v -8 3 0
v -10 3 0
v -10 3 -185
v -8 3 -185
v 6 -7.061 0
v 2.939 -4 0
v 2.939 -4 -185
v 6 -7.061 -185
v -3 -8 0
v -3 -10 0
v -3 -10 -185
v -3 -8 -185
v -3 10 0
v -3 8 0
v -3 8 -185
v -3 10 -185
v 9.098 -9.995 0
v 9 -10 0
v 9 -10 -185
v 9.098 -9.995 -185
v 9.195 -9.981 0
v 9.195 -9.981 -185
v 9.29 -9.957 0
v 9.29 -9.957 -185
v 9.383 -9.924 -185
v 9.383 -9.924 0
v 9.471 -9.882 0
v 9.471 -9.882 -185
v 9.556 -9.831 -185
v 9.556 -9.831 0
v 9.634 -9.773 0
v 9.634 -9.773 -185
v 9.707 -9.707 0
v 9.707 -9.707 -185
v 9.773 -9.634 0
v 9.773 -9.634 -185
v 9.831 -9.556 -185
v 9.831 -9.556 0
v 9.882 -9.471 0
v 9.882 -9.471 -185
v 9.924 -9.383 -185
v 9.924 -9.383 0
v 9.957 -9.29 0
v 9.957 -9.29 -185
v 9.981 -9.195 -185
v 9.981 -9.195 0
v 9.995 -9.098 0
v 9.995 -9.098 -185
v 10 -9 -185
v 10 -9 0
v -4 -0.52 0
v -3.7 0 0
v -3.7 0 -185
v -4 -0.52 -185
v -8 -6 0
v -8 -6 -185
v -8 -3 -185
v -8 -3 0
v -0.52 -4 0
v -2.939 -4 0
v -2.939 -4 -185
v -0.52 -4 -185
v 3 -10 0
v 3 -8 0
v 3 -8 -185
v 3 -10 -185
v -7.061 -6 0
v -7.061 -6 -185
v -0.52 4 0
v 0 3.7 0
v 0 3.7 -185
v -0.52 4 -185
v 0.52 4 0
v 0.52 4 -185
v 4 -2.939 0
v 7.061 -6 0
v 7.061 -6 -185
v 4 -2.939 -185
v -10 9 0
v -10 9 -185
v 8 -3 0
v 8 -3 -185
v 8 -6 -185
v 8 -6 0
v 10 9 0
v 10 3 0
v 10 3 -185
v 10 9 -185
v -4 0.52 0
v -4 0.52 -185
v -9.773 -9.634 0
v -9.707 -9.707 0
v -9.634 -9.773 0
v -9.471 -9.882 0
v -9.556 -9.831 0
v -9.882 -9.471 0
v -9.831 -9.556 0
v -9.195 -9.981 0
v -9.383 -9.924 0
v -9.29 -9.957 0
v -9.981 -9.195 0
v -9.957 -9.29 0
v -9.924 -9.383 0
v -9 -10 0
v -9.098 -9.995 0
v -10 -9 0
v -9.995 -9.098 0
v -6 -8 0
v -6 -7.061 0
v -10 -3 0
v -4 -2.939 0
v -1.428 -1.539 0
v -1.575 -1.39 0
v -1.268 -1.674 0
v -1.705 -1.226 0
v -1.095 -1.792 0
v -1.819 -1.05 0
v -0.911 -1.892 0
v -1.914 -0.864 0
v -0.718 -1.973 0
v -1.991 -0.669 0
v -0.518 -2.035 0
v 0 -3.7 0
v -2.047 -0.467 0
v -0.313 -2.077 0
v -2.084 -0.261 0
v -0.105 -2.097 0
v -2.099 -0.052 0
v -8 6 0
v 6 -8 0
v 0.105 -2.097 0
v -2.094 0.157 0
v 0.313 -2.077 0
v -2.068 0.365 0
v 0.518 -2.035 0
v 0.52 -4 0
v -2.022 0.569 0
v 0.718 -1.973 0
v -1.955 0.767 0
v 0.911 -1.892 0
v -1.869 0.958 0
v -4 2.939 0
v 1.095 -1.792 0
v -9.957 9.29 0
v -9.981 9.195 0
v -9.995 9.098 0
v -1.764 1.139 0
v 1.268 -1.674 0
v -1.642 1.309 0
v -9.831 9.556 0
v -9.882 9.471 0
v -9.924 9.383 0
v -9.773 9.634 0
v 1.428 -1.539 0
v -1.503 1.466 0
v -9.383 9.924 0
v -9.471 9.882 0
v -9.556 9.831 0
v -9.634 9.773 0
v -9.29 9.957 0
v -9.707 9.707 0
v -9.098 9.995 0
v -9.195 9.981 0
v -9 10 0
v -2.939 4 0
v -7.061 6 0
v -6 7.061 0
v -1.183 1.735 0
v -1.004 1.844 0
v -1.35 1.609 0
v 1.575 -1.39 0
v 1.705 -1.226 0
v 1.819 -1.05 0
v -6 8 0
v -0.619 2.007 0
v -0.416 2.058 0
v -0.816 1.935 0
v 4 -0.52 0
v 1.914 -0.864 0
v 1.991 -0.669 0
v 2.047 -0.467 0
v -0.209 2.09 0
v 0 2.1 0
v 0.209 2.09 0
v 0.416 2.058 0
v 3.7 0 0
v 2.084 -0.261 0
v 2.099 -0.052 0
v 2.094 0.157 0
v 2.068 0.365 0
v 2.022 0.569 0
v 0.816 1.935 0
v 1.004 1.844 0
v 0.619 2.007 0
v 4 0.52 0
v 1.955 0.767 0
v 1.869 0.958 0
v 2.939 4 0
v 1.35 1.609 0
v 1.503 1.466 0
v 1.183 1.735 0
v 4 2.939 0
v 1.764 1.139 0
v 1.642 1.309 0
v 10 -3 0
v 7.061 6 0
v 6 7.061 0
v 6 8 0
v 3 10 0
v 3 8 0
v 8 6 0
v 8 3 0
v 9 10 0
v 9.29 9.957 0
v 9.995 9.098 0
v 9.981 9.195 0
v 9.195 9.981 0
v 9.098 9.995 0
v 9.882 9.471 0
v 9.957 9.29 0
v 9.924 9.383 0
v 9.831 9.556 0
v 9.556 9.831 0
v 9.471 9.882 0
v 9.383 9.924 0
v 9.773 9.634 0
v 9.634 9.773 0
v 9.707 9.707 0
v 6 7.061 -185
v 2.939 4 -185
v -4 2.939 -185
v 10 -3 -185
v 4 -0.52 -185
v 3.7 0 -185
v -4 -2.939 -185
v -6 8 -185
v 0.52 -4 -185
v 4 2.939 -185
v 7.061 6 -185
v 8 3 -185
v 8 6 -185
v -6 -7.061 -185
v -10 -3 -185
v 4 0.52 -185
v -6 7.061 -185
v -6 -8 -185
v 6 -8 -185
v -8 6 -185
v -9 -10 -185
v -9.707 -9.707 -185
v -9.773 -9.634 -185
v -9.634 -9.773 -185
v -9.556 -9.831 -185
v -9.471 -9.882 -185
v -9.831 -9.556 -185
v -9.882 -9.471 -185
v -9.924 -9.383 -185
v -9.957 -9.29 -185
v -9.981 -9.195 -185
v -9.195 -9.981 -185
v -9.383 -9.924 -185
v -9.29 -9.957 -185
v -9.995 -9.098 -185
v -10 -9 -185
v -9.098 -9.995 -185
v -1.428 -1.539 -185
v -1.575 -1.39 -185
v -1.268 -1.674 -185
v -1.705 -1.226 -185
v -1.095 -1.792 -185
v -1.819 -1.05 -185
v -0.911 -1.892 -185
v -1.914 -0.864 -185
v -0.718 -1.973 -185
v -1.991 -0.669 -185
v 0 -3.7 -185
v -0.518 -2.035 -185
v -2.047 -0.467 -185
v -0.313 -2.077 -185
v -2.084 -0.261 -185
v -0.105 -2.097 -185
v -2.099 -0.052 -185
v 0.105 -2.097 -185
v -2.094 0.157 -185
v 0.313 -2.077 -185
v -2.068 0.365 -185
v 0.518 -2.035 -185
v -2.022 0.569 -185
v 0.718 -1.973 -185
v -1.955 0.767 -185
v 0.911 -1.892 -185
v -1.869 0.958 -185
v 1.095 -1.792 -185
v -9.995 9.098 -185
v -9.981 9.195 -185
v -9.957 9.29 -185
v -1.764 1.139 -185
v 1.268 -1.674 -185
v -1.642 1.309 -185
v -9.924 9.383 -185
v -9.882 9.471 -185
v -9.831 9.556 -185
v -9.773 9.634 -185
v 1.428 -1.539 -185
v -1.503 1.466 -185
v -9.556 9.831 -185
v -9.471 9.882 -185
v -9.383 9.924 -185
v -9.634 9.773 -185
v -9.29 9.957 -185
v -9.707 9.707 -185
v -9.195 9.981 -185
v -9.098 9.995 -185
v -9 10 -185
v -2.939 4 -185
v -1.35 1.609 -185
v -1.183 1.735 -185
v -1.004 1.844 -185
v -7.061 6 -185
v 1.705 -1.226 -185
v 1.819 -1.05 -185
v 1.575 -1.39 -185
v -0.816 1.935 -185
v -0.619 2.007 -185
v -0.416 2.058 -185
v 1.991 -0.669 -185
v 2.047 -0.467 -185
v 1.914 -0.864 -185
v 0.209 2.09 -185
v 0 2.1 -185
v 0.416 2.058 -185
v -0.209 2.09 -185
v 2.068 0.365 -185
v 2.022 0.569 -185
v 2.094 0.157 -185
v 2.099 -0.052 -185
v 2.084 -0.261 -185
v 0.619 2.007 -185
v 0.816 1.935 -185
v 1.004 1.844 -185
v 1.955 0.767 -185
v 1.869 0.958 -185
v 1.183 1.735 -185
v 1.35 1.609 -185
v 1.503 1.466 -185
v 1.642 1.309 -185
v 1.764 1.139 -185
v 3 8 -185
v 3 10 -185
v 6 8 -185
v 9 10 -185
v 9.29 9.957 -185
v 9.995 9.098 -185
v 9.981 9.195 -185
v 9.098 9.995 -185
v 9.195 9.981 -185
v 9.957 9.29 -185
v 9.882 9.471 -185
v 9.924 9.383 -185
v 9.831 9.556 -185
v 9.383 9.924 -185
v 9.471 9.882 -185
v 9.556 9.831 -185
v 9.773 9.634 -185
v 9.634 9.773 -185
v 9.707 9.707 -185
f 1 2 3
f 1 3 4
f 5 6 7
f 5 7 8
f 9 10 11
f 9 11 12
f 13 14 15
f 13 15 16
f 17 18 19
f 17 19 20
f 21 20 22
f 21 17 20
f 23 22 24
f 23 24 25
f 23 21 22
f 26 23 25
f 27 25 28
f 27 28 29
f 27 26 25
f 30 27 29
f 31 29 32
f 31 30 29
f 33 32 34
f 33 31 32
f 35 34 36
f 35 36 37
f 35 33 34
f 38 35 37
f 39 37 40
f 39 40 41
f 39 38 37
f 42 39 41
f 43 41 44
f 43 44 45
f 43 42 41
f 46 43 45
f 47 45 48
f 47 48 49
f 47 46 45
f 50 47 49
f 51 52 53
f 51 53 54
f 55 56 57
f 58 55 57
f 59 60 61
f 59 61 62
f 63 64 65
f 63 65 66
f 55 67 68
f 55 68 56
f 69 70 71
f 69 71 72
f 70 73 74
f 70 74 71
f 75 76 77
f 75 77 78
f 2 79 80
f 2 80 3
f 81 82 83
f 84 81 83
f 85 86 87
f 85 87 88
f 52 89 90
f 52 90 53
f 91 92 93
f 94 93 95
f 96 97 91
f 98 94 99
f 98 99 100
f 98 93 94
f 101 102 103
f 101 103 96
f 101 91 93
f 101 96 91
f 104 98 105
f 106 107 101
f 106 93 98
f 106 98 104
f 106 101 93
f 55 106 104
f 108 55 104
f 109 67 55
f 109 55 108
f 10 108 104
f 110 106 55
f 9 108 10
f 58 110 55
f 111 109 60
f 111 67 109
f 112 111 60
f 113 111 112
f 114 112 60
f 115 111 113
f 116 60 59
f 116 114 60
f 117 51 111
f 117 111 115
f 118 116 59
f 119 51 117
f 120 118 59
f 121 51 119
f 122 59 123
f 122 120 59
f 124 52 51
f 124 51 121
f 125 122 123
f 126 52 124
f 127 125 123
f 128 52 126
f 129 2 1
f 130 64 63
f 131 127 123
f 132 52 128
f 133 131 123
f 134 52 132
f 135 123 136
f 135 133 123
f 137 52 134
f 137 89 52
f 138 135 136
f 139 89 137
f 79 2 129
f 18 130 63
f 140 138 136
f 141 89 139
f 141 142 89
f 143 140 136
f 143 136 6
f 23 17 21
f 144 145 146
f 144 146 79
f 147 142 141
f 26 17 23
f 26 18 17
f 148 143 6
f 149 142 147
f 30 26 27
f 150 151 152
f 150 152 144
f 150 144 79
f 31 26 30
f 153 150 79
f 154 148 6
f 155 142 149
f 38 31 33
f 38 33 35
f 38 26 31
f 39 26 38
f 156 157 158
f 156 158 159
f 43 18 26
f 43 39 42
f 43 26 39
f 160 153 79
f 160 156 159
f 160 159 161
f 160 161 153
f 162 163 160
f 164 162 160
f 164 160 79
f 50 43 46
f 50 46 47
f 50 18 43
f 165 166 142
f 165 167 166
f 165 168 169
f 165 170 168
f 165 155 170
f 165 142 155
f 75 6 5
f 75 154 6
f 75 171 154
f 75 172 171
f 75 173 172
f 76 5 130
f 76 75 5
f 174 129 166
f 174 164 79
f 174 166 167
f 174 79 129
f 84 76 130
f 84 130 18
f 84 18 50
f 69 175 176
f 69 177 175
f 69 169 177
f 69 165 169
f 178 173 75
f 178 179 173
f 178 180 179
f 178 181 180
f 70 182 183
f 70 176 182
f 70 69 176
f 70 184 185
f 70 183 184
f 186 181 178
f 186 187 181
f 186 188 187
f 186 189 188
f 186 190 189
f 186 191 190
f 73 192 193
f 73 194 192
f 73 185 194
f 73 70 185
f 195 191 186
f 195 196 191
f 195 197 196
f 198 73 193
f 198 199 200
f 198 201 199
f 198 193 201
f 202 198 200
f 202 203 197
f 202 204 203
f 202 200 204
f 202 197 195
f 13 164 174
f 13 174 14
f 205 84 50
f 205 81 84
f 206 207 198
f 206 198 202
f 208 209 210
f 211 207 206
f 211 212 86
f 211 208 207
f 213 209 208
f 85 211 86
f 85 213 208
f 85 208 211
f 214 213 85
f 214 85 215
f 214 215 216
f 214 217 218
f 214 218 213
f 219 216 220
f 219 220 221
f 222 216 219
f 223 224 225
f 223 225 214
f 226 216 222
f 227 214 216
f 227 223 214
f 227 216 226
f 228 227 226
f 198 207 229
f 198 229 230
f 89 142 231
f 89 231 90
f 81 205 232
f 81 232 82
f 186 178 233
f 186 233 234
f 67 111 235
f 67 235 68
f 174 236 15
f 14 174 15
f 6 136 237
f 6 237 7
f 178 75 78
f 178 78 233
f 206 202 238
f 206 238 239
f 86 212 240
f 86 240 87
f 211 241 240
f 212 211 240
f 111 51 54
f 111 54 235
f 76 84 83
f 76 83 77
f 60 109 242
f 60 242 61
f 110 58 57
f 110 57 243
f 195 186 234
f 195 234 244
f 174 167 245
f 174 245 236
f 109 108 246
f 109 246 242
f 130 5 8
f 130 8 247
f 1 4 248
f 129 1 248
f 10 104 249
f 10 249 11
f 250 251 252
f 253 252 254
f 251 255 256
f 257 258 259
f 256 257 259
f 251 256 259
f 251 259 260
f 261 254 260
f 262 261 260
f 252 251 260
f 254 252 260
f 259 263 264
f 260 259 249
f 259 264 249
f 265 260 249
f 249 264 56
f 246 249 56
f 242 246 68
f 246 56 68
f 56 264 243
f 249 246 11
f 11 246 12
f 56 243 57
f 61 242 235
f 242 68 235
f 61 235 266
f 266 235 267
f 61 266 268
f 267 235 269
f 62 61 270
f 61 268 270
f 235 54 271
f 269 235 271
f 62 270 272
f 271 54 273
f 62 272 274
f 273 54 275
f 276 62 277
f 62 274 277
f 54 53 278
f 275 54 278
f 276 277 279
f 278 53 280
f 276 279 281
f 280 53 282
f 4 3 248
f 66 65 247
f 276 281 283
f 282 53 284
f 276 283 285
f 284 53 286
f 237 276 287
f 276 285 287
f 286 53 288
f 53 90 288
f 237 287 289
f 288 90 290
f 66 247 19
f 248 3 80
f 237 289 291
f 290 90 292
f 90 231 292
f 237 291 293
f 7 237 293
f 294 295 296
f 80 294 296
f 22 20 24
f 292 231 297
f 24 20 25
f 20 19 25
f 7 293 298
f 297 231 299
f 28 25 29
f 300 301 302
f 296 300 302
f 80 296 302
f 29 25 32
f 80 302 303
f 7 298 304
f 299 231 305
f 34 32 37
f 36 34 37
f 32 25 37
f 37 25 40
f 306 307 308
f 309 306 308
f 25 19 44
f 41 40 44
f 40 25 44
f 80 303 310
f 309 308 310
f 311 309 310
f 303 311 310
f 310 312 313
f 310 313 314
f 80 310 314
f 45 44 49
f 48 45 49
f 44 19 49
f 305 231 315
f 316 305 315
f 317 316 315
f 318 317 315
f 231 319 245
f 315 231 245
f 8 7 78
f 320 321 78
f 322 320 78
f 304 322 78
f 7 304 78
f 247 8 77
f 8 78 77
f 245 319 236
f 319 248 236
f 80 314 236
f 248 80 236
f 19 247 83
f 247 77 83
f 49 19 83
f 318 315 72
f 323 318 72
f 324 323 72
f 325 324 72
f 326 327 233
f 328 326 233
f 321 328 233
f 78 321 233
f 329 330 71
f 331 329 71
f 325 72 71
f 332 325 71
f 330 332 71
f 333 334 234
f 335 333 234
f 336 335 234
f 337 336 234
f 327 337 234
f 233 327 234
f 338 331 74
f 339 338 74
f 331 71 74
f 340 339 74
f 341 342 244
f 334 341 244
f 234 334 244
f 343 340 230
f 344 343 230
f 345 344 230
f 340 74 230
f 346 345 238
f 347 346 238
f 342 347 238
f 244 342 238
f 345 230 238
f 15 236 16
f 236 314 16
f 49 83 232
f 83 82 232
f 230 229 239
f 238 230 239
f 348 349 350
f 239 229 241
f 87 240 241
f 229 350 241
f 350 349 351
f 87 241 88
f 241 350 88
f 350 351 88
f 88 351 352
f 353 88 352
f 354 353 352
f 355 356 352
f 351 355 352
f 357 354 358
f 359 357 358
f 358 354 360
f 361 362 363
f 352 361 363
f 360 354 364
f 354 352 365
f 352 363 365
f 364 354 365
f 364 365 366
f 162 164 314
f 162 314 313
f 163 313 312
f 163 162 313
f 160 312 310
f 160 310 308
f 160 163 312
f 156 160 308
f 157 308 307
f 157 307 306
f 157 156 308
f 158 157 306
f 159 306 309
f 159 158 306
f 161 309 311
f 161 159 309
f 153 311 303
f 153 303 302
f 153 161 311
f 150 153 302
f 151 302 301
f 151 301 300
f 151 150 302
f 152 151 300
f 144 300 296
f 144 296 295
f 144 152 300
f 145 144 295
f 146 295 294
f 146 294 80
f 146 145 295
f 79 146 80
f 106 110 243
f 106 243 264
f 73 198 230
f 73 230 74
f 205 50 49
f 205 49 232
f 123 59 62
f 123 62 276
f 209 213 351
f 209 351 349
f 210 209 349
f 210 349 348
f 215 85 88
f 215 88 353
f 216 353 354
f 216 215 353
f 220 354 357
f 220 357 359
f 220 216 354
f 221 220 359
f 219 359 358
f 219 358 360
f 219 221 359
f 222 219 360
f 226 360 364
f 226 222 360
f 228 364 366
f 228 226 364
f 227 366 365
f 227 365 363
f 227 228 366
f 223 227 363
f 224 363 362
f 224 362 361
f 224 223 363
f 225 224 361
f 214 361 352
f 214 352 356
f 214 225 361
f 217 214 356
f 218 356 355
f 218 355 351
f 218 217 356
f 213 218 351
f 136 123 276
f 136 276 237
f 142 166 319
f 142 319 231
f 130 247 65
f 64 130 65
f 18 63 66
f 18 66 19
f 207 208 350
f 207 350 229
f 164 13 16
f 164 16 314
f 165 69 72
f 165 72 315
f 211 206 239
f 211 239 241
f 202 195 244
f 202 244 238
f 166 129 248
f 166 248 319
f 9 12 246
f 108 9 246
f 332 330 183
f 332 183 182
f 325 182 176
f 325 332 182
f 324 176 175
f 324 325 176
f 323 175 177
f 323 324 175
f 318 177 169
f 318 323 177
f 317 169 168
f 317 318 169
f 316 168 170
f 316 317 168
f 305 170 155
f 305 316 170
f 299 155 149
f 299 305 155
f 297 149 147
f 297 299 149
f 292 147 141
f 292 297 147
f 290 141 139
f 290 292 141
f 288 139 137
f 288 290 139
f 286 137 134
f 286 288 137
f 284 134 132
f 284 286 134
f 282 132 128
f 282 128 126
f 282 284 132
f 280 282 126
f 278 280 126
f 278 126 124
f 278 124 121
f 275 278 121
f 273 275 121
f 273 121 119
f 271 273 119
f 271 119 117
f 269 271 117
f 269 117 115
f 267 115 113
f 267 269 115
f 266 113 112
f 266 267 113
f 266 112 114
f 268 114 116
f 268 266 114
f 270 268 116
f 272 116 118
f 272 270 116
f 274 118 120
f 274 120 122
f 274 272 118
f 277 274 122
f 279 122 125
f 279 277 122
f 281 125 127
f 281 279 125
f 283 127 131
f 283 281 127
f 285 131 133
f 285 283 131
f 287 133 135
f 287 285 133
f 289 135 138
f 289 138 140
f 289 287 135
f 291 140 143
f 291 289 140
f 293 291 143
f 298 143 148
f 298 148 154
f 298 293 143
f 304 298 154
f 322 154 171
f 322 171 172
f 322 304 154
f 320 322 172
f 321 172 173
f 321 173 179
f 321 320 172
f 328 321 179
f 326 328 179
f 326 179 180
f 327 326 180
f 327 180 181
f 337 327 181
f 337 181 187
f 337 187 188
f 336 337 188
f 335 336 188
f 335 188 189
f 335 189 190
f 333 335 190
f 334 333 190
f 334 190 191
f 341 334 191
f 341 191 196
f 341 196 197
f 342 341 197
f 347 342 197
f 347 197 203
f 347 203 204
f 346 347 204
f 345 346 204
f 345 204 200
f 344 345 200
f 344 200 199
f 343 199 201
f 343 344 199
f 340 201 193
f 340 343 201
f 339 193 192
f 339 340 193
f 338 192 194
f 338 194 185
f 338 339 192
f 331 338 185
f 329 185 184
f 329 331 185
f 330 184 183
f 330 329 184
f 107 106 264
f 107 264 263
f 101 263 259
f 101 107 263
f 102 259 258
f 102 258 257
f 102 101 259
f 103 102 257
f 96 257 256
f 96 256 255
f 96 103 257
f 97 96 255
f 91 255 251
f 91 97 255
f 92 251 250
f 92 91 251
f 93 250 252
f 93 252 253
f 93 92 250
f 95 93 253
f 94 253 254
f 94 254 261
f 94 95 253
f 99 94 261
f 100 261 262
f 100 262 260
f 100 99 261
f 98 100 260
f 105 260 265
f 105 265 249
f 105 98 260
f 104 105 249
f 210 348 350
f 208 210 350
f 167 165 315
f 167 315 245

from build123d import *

# Parameters (mm, degrees)
EXTRUDE_1_DEPTH = 185
SKETCH_2_W      = 260
SKETCH_2_H      = 2.1


with BuildPart() as part:
    # ｽｹｯﾁ1 → ﾎﾞｽ - 押し出し1 (new body)
    with BuildSketch(Plane.XY):
        with BuildLine():
            Line((-10, -3), (-10, -9))
            ThreePointArc((-10, -9), (-9.707106781, -9.707106781), (-9, -10))
            Line((-9, -10), (-3, -10))
            Line((-3, -10), (-3, -8))
            Line((-3, -8), (-6, -8))
            Line((-6, -8), (-6, -7.060660172))
            Line((-6, -7.060660172), (-2.939339828, -4))
            Line((-2.939339828, -4), (-0.519615242, -4))
            Line((-0.519615242, -4), (0, -3.7))
            Line((0, -3.7), (0.519615242, -4))
            Line((0.519615242, -4), (2.939339828, -4))
            Line((2.939339828, -4), (6, -7.060660172))
            Line((6, -7.060660172), (6, -8))
            Line((6, -8), (3, -8))
            Line((3, -8), (3, -10))
            Line((3, -10), (9, -10))
            ThreePointArc((9, -10), (9.707106781, -9.707106781), (10, -9))
            Line((10, -9), (10, -3))
            Line((10, -3), (8, -3))
            Line((8, -3), (8, -6))
            Line((8, -6), (7.060660172, -6))
            Line((7.060660172, -6), (4, -2.939339828))
            Line((4, -2.939339828), (4, -0.519615242))
            Line((4, -0.519615242), (3.7, 0))
            Line((3.7, 0), (4, 0.519615242))
            Line((4, 0.519615242), (4, 2.939339828))
            Line((4, 2.939339828), (7.060660172, 6))
            Line((7.060660172, 6), (8, 6))
            Line((8, 6), (8, 3))
            Line((8, 3), (10, 3))
            Line((10, 3), (10, 9))
            ThreePointArc((10, 9), (9.707106781, 9.707106781), (9, 10))
            Line((9, 10), (3, 10))
            Line((3, 10), (3, 8))
            Line((3, 8), (6, 8))
            Line((6, 8), (6, 7.060660172))
            Line((6, 7.060660172), (2.939339828, 4))
            Line((2.939339828, 4), (0.519615242, 4))
            Line((0.519615242, 4), (0, 3.7))
            Line((0, 3.7), (-0.519615242, 4))
            Line((-0.519615242, 4), (-2.939339828, 4))
            Line((-2.939339828, 4), (-6, 7.060660172))
            Line((-6, 7.060660172), (-6, 8))
            Line((-6, 8), (-3, 8))
            Line((-3, 8), (-3, 10))
            Line((-3, 10), (-9, 10))
            ThreePointArc((-9, 10), (-9.707106781, 9.707106781), (-10, 9))
            Line((-10, 9), (-10, 3))
            Line((-10, 3), (-8, 3))
            Line((-8, 3), (-8, 6))
            Line((-8, 6), (-7.060660172, 6))
            Line((-7.060660172, 6), (-4, 2.939339828))
            Line((-4, 2.939339828), (-4, 0.519615242))
            Line((-4, 0.519615242), (-3.7, 0))
            Line((-3.7, 0), (-4, -0.519615242))
            Line((-4, -0.519615242), (-4, -2.939339828))
            Line((-4, -2.939339828), (-7.060660172, -6))
            Line((-7.060660172, -6), (-8, -6))
            Line((-8, -6), (-8, -3))
            Line((-8, -3), (-10, -3))
        make_face()
    extrude(amount=-EXTRUDE_1_DEPTH)

    # ｽｹｯﾁ2 → ｶｯﾄ - 回転1 (revolve, cut)
    with BuildSketch(Plane(origin=(0, 0, 0), x_dir=(0, 0, -1), z_dir=(1, 0, 0))):
        with Locations((130, 1.05)):
            Rectangle(SKETCH_2_W, SKETCH_2_H)
    revolve(axis=Axis((0, 0, -260), (0, 0, 1)), mode=Mode.SUBTRACT)


solid = part.part
